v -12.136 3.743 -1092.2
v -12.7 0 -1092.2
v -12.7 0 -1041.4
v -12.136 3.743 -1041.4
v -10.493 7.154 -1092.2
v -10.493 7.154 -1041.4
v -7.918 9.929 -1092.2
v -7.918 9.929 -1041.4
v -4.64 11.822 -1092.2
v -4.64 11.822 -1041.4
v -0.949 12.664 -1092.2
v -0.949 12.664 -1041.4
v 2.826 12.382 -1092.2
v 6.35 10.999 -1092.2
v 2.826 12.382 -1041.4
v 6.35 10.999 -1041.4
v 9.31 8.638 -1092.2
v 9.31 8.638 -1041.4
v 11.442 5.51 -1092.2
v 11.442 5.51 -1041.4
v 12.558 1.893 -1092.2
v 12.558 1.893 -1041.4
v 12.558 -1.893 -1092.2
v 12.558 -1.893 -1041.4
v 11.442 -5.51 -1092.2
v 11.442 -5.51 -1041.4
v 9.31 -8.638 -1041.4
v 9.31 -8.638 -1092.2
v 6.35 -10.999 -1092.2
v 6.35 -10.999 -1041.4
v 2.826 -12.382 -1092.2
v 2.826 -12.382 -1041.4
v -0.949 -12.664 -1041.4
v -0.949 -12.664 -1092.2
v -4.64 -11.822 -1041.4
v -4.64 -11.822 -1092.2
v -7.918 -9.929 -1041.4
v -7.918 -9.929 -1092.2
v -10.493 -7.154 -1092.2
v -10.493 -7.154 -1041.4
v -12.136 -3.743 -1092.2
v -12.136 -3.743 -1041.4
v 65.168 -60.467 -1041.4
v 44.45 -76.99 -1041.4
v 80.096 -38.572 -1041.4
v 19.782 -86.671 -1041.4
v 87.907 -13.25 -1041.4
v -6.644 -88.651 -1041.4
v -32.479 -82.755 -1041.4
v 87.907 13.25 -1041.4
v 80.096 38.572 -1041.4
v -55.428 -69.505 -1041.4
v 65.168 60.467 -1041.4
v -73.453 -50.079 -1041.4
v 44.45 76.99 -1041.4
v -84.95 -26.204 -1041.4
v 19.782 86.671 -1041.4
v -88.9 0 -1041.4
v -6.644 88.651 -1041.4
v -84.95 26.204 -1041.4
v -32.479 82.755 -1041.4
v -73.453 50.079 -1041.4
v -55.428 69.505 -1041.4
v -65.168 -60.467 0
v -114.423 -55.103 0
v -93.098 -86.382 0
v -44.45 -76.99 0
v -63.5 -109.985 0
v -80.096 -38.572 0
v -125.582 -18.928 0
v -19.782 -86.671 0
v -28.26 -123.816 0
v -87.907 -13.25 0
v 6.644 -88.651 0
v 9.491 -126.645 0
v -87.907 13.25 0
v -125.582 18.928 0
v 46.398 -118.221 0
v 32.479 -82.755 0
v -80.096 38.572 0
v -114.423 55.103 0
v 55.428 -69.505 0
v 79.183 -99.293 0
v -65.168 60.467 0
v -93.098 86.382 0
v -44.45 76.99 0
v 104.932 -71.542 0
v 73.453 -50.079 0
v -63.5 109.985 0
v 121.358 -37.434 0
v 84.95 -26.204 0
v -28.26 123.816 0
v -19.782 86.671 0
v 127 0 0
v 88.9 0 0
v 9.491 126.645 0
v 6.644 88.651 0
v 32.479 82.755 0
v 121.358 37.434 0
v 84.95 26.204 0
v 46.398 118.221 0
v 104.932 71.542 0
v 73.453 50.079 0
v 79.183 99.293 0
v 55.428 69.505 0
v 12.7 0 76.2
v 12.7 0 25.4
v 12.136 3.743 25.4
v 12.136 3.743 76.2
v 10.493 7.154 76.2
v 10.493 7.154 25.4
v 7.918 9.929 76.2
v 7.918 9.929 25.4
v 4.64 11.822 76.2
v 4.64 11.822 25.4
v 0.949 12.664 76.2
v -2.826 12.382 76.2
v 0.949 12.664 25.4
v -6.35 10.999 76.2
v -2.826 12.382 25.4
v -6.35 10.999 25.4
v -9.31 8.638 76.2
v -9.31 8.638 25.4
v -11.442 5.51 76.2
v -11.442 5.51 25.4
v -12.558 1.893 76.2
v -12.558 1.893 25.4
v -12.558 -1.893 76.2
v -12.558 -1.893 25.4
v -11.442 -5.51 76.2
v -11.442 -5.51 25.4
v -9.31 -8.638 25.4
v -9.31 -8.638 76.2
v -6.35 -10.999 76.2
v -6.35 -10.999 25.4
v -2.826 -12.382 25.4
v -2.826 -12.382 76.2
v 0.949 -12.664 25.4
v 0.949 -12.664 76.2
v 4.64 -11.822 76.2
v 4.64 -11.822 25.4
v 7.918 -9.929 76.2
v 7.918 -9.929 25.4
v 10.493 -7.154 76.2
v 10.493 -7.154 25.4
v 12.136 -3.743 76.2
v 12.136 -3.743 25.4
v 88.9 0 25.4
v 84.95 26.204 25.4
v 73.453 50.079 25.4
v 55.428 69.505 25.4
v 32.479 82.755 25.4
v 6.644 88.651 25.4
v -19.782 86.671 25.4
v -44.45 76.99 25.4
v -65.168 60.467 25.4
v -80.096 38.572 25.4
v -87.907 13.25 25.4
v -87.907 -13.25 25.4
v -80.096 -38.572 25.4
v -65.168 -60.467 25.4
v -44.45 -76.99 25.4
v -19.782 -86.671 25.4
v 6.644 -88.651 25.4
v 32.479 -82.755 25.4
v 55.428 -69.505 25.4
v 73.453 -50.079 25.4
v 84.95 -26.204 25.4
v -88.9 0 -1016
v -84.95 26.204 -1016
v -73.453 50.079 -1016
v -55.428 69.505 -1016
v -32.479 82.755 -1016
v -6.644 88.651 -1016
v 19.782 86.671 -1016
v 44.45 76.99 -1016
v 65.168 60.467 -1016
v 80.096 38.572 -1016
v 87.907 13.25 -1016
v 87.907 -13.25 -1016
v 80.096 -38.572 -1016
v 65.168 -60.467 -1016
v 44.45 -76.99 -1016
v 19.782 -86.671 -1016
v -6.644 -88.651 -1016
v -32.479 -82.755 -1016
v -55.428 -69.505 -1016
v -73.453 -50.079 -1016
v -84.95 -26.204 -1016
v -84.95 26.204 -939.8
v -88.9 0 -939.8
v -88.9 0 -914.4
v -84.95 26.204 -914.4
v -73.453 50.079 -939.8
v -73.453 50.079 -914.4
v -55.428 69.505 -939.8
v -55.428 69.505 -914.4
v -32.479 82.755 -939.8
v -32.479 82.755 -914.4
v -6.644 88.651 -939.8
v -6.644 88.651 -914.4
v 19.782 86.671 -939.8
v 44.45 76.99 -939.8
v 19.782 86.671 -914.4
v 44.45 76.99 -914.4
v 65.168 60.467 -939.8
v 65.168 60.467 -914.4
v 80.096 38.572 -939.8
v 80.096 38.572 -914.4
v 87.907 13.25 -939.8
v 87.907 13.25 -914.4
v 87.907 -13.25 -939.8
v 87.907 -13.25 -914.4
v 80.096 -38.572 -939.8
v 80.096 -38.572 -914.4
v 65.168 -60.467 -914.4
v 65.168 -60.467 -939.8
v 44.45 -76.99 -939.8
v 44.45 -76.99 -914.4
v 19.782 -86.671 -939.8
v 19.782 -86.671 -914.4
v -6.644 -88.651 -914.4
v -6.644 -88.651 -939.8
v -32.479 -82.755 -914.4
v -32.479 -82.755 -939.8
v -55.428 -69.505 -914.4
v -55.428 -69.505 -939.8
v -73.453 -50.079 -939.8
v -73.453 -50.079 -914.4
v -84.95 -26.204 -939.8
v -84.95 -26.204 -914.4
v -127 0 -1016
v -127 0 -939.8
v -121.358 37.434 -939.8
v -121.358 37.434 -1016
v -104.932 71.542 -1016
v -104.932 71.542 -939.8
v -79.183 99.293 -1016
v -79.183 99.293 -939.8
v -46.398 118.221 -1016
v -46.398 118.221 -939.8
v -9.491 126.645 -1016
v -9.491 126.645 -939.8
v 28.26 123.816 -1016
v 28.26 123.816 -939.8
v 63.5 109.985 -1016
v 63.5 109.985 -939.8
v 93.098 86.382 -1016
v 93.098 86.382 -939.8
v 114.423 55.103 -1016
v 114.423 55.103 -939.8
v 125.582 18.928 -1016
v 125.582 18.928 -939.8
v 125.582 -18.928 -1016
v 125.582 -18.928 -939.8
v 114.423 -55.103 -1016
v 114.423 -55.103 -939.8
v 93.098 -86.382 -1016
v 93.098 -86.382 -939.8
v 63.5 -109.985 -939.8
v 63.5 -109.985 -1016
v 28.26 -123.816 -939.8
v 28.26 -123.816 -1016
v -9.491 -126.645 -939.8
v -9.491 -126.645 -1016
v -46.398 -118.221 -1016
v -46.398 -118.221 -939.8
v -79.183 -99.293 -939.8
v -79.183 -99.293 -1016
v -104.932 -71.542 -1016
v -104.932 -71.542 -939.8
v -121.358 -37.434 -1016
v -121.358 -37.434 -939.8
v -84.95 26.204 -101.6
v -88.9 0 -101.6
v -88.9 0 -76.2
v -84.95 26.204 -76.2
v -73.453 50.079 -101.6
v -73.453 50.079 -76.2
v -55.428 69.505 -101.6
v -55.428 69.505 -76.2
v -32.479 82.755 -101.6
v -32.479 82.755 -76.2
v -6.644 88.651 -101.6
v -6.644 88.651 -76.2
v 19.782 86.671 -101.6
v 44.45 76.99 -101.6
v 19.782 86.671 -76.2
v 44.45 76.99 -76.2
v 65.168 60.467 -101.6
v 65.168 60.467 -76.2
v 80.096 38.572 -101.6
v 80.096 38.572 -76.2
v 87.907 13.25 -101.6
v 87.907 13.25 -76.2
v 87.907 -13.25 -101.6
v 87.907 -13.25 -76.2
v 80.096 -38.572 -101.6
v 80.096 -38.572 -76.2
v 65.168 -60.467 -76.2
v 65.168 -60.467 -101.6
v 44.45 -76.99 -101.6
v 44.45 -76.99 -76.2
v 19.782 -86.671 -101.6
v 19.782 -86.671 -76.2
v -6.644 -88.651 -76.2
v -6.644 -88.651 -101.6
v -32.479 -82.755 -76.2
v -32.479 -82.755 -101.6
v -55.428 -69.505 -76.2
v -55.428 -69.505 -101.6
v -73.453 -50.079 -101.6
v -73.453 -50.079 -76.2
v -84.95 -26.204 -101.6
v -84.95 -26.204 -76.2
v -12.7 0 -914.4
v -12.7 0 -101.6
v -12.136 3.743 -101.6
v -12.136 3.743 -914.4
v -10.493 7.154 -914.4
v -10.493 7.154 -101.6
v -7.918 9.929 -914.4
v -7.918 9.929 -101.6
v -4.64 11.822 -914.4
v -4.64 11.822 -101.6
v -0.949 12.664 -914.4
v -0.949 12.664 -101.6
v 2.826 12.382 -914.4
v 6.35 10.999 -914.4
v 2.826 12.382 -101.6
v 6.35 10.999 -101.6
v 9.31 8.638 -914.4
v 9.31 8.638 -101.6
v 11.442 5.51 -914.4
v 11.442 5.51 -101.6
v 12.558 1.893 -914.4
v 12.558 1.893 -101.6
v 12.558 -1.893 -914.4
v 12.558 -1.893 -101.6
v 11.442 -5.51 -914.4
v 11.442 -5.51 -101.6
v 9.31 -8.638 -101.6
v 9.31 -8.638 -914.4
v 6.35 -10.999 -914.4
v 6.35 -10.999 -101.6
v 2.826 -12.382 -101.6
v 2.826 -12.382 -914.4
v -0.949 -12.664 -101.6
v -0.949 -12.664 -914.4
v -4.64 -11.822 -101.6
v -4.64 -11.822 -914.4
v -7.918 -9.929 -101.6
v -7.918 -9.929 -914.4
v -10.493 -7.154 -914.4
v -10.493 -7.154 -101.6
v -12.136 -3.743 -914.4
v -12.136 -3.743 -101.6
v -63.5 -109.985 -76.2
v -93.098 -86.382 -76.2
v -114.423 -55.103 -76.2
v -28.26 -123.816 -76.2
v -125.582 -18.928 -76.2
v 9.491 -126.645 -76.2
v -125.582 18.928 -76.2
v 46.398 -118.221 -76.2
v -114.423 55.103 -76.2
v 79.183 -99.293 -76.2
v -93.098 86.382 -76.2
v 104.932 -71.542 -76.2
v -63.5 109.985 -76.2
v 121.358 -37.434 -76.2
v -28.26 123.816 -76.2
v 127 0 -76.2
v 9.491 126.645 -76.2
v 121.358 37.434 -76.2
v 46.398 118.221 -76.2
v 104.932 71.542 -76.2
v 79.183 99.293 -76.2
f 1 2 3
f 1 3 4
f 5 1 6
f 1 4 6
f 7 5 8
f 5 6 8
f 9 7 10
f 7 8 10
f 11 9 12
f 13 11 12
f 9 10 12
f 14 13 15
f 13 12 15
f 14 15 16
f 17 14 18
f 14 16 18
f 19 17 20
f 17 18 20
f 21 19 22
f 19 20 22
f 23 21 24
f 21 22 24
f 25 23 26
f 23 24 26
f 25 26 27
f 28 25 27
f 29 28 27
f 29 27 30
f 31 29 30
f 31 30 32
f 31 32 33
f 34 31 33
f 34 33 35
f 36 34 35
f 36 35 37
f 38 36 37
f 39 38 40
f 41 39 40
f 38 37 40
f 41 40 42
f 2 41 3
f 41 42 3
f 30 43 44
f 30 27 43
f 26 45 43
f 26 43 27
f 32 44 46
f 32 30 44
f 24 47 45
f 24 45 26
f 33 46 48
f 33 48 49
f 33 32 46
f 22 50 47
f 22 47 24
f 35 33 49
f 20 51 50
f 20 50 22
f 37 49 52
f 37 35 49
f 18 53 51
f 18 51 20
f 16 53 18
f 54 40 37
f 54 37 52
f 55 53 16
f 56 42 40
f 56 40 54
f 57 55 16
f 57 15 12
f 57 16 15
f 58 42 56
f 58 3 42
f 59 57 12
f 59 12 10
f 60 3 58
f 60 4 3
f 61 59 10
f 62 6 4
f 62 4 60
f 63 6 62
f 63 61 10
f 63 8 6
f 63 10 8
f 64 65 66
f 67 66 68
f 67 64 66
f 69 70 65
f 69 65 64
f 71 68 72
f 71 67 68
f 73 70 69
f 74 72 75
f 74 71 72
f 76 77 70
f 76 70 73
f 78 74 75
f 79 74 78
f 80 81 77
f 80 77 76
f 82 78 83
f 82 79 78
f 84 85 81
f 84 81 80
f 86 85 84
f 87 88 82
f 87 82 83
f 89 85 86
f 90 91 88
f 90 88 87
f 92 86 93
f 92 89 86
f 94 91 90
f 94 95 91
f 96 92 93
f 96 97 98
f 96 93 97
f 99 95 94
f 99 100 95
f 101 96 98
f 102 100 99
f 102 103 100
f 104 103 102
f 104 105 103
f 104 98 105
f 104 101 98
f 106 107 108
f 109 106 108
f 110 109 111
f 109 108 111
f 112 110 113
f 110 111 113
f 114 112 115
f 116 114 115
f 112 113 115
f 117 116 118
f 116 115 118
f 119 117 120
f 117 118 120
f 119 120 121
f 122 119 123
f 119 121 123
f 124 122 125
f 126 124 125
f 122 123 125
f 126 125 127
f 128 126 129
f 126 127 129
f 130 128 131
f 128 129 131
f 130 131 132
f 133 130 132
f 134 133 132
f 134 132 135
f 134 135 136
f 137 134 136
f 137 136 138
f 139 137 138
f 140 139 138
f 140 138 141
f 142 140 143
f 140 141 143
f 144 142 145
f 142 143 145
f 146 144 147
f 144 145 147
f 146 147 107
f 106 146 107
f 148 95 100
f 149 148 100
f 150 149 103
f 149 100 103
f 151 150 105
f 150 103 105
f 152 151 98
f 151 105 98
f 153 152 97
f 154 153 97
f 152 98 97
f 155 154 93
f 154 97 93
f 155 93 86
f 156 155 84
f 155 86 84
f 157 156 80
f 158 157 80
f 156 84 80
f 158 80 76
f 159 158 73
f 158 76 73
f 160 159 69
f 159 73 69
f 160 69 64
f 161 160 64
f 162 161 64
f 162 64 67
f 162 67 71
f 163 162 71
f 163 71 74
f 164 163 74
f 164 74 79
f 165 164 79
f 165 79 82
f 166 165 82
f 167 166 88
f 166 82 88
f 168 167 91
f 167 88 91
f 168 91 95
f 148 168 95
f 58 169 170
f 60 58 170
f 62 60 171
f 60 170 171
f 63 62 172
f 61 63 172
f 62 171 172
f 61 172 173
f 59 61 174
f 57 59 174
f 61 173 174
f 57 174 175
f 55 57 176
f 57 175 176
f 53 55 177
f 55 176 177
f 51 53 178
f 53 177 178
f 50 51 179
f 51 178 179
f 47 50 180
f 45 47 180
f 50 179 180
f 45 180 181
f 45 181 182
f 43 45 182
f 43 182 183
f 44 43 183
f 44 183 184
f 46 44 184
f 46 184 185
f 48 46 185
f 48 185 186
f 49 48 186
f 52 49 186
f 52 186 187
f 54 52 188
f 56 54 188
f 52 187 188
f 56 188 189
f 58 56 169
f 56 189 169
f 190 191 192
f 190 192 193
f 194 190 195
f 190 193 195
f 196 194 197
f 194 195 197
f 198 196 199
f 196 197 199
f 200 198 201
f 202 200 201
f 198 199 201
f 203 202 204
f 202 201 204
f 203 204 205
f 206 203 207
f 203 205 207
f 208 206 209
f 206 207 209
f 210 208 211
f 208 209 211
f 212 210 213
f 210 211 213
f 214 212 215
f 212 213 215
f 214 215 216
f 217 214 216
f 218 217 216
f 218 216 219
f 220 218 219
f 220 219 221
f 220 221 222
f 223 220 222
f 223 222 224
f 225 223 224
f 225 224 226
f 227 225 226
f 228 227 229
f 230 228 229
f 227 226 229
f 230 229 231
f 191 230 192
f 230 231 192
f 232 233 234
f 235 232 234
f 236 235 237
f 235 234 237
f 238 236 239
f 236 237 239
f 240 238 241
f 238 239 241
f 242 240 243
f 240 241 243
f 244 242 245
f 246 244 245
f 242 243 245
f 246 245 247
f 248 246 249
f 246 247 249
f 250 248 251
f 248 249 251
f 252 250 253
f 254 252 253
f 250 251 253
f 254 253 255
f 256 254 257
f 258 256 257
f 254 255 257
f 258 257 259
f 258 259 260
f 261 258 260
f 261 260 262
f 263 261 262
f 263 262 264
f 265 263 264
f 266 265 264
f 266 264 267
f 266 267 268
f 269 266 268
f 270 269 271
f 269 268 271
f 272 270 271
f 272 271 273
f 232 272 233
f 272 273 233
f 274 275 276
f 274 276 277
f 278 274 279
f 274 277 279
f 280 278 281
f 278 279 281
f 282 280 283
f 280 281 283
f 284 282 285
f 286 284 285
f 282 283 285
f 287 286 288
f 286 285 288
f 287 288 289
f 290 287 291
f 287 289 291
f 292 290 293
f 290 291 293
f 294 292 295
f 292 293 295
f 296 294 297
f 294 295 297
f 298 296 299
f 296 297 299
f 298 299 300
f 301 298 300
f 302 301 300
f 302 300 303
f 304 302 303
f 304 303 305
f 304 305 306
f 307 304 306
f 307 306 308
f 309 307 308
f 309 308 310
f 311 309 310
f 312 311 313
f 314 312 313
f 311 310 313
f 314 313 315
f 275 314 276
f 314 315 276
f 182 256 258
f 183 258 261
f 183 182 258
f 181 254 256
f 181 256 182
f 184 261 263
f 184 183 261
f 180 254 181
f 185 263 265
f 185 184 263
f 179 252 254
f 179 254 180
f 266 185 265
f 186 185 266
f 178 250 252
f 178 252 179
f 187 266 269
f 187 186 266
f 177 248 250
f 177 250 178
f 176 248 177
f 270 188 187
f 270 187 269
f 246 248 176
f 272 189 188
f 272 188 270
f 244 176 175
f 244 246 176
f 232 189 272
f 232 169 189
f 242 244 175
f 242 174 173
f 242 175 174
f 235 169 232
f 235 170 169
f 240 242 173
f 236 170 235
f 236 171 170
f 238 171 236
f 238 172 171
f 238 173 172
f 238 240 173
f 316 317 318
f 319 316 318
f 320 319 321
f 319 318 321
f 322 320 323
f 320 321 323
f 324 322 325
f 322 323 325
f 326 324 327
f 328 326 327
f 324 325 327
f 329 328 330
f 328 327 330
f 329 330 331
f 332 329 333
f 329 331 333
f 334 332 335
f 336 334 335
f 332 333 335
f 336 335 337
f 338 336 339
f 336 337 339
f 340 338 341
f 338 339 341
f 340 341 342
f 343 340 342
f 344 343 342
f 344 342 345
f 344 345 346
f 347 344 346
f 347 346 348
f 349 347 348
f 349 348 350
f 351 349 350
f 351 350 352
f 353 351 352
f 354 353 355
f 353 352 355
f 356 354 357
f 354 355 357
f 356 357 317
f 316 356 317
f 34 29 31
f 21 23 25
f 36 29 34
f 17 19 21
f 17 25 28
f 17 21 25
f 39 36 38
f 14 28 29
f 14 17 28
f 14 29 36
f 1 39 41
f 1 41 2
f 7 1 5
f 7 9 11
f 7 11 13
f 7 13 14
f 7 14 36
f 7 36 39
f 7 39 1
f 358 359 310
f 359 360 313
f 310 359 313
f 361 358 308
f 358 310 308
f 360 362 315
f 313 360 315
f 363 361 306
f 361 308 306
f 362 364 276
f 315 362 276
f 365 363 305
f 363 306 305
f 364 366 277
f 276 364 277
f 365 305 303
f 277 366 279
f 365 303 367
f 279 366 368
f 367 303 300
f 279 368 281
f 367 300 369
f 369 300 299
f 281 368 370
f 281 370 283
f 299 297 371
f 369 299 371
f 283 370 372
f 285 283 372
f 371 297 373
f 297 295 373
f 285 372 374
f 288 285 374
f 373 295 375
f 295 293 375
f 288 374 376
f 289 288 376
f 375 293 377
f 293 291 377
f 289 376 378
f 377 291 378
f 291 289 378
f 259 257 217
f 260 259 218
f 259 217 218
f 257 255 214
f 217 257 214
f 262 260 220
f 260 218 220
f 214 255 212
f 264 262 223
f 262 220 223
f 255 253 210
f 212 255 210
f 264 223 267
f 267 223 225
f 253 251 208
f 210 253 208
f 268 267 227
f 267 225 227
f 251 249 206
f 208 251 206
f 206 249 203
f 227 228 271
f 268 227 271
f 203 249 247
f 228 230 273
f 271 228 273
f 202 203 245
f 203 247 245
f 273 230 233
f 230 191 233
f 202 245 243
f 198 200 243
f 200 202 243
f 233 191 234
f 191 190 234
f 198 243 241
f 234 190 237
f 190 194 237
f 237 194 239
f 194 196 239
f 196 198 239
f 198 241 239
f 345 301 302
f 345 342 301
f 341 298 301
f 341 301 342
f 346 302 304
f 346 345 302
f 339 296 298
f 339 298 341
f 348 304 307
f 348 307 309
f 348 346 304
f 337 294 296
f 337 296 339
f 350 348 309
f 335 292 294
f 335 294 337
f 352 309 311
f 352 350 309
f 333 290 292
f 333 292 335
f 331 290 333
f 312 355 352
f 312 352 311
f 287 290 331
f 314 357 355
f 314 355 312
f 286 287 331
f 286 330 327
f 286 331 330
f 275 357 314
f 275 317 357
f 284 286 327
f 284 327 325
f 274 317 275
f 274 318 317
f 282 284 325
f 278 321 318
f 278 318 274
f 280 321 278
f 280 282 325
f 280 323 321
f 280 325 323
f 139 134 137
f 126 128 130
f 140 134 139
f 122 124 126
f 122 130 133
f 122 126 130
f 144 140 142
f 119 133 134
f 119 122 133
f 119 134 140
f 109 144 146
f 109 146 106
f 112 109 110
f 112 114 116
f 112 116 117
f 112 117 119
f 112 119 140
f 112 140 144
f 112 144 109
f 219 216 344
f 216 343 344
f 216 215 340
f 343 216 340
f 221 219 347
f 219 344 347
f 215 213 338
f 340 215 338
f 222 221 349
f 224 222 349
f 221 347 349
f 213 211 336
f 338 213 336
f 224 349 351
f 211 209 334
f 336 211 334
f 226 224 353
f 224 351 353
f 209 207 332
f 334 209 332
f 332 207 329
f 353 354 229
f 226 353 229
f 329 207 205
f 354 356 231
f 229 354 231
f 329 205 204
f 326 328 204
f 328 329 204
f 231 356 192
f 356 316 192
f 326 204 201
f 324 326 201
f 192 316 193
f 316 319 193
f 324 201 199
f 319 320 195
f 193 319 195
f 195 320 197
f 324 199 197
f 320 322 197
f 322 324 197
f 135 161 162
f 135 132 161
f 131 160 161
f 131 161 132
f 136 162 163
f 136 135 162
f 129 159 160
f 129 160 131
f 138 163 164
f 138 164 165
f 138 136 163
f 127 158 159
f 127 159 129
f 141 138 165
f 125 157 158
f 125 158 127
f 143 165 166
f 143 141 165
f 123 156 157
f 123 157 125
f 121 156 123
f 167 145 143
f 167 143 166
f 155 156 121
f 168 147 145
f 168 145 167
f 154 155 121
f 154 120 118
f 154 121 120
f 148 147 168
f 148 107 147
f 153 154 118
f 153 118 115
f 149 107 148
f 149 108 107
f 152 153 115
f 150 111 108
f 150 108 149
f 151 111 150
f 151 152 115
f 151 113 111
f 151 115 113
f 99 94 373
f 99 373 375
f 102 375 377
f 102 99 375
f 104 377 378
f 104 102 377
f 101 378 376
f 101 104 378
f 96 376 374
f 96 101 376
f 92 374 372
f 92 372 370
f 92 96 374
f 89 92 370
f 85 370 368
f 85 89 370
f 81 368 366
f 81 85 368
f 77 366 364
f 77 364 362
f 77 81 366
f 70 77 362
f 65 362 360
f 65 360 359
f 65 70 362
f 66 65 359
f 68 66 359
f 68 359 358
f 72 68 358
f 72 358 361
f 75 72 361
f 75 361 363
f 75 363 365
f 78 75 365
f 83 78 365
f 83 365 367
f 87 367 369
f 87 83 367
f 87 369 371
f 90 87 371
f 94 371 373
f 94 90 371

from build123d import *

# Parameters (mm, degrees)
SKETCH1_R           = 127
BOSS_EXTRUDE1_DEPTH = 76.2
SKETCH2_R           = 88.9
BOSS_EXTRUDE2_DEPTH = 25.4
SKETCH3_R           = 12.7
BOSS_EXTRUDE3_DEPTH = 50.8
SKETCH4_R           = 88.9
BOSS_EXTRUDE4_DEPTH = 25.4
SKETCH6_R           = 12.7
BOSS_EXTRUDE5_DEPTH = 812.8
SKETCH7_R           = 88.9
BOSS_EXTRUDE6_DEPTH = 25.4
SKETCH8_R           = 127
BOSS_EXTRUDE7_DEPTH = 76.2
SKETCH9_R           = 88.9
BOSS_EXTRUDE8_DEPTH = 25.4
SKETCH10_R          = 12.7
BOSS_EXTRUDE9_DEPTH = 50.8


with BuildPart() as part:
    # Sketch1 → Boss-Extrude1 (new body)
    with BuildSketch(Plane.XY):
        Circle(SKETCH1_R)
    extrude(amount=-BOSS_EXTRUDE1_DEPTH)

    # Sketch2 → Boss-Extrude2 (add)
    with BuildSketch(Plane.XY):
        Circle(SKETCH2_R)
    extrude(amount=BOSS_EXTRUDE2_DEPTH)

    # Sketch3 → Boss-Extrude3 (add)
    with BuildSketch(Plane.XY.offset(25.4)):
        Circle(SKETCH3_R)
    extrude(amount=BOSS_EXTRUDE3_DEPTH)

    # Sketch4 → Boss-Extrude4 (add)
    with BuildSketch(Plane(origin=(0, 0, -76.2), x_dir=(-1, 0, 0), z_dir=(0, 0, -1))):
        Circle(SKETCH4_R)
    extrude(amount=BOSS_EXTRUDE4_DEPTH)

    # Sketch6 → Boss-Extrude5 (add)
    with BuildSketch(Plane(origin=(0, 0, -101.6), x_dir=(-1, 0, 0), z_dir=(0, 0, -1))):
        Circle(SKETCH6_R)
    extrude(amount=BOSS_EXTRUDE5_DEPTH)

    # Sketch7 → Boss-Extrude6 (add)
    with BuildSketch(Plane(origin=(0, 0, -914.4), x_dir=(-1, 0, 0), z_dir=(0, 0, -1))):
        Circle(SKETCH7_R)
    extrude(amount=BOSS_EXTRUDE6_DEPTH)

    # Sketch8 → Boss-Extrude7 (add)
    with BuildSketch(Plane(origin=(0, 0, -939.8), x_dir=(-1, 0, 0), z_dir=(0, 0, -1))):
        Circle(SKETCH8_R)
    extrude(amount=BOSS_EXTRUDE7_DEPTH)

    # Sketch9 → Boss-Extrude8 (add)
    with BuildSketch(Plane(origin=(0, 0, -1016), x_dir=(-1, 0, 0), z_dir=(0, 0, -1))):
        Circle(SKETCH9_R)
    extrude(amount=BOSS_EXTRUDE8_DEPTH)

    # Sketch10 → Boss-Extrude9 (add)
    with BuildSketch(Plane(origin=(0, 0, -1041.4), x_dir=(-1, 0, 0), z_dir=(0, 0, -1))):
        Circle(SKETCH10_R)
    extrude(amount=BOSS_EXTRUDE9_DEPTH)


solid = part.part
